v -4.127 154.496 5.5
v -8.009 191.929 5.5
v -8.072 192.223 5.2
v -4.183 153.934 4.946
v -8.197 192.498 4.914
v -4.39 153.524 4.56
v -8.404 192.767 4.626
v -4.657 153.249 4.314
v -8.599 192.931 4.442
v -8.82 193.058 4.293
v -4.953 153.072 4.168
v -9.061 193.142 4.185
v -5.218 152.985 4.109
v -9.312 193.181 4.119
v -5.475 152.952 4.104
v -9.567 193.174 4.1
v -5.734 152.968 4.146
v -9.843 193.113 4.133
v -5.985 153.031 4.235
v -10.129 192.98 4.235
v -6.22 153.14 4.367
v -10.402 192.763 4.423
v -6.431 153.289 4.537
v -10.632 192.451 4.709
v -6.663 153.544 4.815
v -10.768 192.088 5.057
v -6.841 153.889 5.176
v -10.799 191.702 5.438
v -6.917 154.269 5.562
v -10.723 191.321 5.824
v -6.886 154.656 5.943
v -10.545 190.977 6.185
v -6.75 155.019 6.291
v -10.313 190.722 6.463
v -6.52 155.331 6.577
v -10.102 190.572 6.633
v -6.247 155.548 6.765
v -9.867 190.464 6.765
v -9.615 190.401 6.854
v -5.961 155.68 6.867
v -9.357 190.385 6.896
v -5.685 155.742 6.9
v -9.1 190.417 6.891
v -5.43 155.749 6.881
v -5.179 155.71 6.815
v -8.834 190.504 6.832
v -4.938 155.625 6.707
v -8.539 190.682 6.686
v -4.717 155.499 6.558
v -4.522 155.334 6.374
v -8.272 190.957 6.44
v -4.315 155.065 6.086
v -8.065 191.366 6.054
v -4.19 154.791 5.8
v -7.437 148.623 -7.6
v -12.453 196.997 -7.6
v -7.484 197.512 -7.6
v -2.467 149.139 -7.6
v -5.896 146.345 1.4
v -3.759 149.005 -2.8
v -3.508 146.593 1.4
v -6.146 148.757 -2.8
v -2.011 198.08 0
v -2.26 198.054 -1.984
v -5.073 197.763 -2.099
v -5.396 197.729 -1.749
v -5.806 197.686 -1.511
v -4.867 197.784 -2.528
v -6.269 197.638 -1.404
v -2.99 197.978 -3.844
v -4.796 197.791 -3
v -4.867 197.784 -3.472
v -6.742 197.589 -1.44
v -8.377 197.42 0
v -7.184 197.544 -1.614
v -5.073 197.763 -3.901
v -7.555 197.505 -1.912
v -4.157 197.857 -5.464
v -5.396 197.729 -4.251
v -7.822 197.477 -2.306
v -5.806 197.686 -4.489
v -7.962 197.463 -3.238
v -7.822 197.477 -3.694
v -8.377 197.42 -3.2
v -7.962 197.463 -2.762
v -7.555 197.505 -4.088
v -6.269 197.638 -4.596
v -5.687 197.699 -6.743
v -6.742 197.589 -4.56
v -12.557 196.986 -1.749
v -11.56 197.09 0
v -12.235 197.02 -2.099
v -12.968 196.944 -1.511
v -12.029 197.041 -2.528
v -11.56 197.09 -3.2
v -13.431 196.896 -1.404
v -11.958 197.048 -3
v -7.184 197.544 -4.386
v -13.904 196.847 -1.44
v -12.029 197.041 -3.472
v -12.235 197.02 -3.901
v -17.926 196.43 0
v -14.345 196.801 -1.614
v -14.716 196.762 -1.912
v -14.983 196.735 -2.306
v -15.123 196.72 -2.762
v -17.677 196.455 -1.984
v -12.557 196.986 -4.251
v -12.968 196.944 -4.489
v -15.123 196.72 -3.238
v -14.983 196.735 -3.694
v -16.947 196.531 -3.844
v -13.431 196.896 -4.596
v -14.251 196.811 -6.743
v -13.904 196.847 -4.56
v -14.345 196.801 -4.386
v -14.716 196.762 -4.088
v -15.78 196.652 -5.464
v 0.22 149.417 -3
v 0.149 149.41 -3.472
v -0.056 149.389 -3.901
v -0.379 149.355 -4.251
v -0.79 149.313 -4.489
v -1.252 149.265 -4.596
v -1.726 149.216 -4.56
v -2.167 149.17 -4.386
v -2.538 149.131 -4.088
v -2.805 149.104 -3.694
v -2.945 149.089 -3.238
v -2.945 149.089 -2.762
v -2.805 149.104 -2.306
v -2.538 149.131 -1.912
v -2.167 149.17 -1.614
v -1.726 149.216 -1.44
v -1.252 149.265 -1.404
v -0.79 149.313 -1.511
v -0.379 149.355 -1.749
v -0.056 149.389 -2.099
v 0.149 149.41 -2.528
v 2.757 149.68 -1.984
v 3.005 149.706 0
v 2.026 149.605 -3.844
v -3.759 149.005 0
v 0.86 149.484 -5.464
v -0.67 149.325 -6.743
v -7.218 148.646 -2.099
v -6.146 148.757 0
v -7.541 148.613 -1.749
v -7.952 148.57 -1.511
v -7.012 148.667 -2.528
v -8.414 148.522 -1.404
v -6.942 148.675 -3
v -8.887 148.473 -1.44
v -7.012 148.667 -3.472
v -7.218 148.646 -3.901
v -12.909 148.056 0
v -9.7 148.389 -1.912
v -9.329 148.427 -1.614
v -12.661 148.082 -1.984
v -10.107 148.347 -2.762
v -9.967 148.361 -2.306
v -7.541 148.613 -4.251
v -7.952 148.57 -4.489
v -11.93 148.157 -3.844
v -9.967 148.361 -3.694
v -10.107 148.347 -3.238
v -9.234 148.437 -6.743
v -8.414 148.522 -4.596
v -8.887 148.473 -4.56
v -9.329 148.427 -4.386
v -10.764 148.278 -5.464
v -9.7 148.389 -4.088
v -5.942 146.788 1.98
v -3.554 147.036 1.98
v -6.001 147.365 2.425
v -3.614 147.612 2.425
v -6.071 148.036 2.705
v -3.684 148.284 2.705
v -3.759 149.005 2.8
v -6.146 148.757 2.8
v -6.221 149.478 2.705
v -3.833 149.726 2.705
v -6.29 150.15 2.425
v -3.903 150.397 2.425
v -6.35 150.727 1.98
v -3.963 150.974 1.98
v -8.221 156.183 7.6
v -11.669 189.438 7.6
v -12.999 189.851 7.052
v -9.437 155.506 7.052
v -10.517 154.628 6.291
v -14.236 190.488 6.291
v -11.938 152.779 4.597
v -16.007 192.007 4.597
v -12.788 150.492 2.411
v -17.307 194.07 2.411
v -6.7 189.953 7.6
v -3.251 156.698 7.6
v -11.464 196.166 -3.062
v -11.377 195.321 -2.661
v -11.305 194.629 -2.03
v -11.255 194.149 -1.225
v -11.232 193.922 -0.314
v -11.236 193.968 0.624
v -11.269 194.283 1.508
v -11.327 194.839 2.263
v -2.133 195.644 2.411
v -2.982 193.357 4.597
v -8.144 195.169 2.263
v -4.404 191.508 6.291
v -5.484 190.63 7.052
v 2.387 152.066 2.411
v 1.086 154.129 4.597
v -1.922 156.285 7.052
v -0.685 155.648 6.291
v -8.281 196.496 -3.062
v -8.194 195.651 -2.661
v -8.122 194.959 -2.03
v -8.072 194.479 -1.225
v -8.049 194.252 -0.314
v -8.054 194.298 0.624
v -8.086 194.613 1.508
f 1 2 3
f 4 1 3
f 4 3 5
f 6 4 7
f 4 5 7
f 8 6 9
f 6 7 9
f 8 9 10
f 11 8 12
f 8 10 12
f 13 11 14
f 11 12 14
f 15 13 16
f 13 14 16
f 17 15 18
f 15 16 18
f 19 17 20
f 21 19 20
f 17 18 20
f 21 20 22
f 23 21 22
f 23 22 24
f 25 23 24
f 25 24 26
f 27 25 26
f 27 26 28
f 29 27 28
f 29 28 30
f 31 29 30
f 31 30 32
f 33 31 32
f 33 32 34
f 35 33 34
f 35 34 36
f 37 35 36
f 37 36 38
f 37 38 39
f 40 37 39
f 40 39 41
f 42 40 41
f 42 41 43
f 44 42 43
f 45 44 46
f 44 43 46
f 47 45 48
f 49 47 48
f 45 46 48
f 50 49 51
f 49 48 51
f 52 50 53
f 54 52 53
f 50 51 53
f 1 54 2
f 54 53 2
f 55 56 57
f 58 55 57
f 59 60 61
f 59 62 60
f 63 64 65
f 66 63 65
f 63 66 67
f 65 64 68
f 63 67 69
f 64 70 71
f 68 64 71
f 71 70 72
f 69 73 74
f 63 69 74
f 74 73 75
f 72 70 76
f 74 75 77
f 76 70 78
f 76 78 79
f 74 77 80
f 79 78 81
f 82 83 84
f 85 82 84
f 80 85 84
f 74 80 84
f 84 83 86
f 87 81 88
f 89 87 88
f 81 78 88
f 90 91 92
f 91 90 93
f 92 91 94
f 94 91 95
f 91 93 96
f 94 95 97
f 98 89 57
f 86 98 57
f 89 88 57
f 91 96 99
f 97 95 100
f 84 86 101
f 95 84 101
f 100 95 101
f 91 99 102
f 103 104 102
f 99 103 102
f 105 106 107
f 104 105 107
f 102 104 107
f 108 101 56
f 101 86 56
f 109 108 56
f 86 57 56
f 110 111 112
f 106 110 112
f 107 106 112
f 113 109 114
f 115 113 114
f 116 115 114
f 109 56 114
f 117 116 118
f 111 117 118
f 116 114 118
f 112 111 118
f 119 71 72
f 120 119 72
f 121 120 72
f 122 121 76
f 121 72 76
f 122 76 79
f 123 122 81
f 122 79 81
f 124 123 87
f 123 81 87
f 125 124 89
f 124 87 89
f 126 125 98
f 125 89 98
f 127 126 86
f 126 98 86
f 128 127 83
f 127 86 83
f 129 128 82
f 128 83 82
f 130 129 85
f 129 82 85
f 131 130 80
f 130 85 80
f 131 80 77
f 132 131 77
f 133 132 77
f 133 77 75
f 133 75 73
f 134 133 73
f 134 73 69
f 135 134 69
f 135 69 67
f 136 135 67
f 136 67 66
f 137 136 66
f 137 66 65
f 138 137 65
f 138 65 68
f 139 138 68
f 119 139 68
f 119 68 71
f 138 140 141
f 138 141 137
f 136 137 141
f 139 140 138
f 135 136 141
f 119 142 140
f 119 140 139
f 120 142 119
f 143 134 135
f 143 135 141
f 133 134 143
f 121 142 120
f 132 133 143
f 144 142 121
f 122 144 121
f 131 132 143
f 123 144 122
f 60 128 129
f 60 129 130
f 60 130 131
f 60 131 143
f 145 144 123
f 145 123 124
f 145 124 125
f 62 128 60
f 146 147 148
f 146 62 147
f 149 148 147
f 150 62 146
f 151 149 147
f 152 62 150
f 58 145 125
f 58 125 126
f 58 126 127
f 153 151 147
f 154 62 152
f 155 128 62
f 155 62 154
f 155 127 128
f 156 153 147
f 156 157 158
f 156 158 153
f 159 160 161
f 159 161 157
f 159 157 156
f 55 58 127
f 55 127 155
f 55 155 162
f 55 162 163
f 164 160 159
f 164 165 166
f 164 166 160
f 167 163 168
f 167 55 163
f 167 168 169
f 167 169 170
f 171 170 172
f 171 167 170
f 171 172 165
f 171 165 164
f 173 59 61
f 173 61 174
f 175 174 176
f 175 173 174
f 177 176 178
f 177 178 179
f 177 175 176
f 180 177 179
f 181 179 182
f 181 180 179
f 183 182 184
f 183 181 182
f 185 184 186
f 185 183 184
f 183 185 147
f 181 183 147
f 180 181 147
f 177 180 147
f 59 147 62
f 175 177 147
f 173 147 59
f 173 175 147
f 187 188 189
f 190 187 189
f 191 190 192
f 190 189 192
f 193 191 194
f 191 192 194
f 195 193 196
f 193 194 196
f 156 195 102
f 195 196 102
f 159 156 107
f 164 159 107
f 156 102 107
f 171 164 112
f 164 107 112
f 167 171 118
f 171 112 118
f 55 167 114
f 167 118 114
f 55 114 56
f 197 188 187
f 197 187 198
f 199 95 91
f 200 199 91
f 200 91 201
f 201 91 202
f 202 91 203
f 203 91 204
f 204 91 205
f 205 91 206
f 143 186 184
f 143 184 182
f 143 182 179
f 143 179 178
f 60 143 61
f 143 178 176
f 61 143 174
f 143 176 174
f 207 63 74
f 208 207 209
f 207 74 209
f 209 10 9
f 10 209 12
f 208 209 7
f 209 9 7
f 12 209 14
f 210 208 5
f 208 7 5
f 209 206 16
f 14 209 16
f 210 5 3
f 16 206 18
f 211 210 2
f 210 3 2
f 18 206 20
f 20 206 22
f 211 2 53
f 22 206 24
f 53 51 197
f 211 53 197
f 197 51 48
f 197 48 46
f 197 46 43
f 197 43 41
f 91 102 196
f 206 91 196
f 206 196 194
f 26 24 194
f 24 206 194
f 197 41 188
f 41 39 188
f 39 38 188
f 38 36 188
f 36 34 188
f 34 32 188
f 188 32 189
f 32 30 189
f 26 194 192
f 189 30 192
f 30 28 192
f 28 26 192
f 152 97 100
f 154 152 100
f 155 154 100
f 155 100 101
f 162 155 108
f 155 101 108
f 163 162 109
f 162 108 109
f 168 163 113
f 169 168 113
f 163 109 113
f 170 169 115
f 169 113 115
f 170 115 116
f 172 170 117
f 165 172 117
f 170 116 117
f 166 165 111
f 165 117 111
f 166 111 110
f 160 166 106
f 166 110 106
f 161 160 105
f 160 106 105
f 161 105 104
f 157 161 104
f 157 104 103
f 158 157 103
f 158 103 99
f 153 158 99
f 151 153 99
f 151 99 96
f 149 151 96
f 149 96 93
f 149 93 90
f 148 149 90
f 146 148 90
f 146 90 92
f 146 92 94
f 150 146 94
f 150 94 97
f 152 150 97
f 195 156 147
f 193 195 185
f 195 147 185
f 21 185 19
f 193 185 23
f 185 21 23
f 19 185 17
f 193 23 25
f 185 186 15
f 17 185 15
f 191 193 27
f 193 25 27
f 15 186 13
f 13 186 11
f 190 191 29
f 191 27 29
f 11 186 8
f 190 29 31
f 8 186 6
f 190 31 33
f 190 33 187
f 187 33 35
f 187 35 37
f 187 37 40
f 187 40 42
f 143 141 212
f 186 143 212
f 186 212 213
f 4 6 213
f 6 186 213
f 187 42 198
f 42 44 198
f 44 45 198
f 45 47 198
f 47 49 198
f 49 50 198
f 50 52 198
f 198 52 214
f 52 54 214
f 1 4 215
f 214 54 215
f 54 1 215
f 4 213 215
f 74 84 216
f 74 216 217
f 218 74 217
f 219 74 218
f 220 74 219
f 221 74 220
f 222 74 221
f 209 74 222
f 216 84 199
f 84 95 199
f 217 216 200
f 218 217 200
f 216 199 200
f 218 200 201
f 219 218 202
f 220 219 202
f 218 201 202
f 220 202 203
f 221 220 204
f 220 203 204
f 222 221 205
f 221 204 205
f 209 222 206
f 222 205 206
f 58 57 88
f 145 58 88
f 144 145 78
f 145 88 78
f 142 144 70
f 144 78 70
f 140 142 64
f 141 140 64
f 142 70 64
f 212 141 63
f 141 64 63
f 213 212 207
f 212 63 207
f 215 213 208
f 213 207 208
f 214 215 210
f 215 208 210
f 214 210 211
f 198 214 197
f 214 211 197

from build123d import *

# Parameters (mm, degrees)
SKETCH3_R               = 8
BOSS_EXTRUDE1_DEPTH     = 48.633157895
CUT_EXTRUDE1_DEPTH      = 13.989776257
CUT_EXTRUDE1_DEPTH_BACK = 13.989776257
BOSS_EXTRUDE2_DEPTH     = 1.2
CUT_EXTRUDE2_DEPTH      = 1.6
SKETCH8_R               = 1.4
SKETCH8_R_2             = 1.6
CUT_EXTRUDE3_DEPTH      = 2.64160469
CUT_EXTRUDE3_DEPTH_BACK = 52.97615102
CUT_EXTRUDE4_DEPTH      = 52.97615102


with BuildPart() as part:
    # Sketch3 → Boss-Extrude1 (new body)
    with BuildSketch(Plane(origin=(-20.344467381, 196.178792599, 0), x_dir=(-0.994665758, -0.103150523, 0), z_dir=(0.103150523, -0.994665758, 0))):
        with Locations((-10.431405186, 0)):
            Circle(SKETCH3_R)
    extrude(amount=BOSS_EXTRUDE1_DEPTH)

    # Sketch4 → Cut-Extrude1 (cut, two sides)
    with BuildSketch(Plane(origin=(10.375761543, 1.076004901, 0), x_dir=(0.103150523, -0.994665758, 0), z_dir=(-0.994665758, -0.103150523, 0))) as cut_extrude1_sk:
        Polygon((-197.230869842, 0), (-189.230869842, 8), (-197.230869842, 8), align=None)
        Polygon((-156.597711947, 8), (-148.597711947, 8), (-148.597711947, 0), align=None)
    extrude(amount=CUT_EXTRUDE1_DEPTH, mode=Mode.SUBTRACT)
    extrude(cut_extrude1_sk.sketch, amount=-CUT_EXTRUDE1_DEPTH_BACK, mode=Mode.SUBTRACT)

    # Sketch5 → Boss-Extrude2 (add, symmetric)
    with BuildSketch(Plane(origin=(10.375761543, 1.076004901, 0), x_dir=(0.103150523, -0.994665758, 0), z_dir=(-0.994665758, -0.103150523, 0))):
        with BuildLine():
            Line((-148.597711947, -2.8), (-146.172840817, 1.4))
            ThreePointArc((-146.172840817, 1.4), (-148.232238609, 2.776045612), (-150.577610935, 1.979898987))
            Line((-150.577610935, 1.979898987), (-148.597711947, 0))
            Line((-148.597711947, 0), (-148.597711947, -2.8))
        make_face()
    extrude(amount=BOSS_EXTRUDE2_DEPTH, both=True)

    # Sketch7 → Cut-Extrude2 (cut, symmetric)
    with BuildSketch(Plane(origin=(10.375761543, 1.076004901, 0), x_dir=(0.103150523, -0.994665758, 0), z_dir=(-0.994665758, -0.103150523, 0))):
        with BuildLine():
            Line((-194.968128142, 2.2627417), (-197.230869842, 0))
            Line((-197.230869842, 0), (-197.230869842, -3.2))
            ThreePointArc((-197.230869842, -3.2), (-194.274455338, -1.224586984), (-194.968128142, 2.2627417))
        make_face()
    extrude(amount=CUT_EXTRUDE2_DEPTH, both=True, mode=Mode.SUBTRACT)

    # Sketch8 → Cut-Extrude3 (cut, two sides)
    with BuildSketch(Plane(origin=(-20.344467381, 196.178792599, 0), x_dir=(0.994665758, 0.103150523, 0), z_dir=(-0.103150523, 0.994665758, 0))) as cut_extrude3_sk:
        with Locations((10.431405186, -5.5)):
            Circle(SKETCH8_R)
        with Locations((6.831405186, 3)):
            Circle(SKETCH8_R_2)
        with Locations((14.031405186, 3)):
            Circle(SKETCH8_R_2)
    extrude(amount=CUT_EXTRUDE3_DEPTH, mode=Mode.SUBTRACT)
    extrude(cut_extrude3_sk.sketch, amount=-CUT_EXTRUDE3_DEPTH_BACK, mode=Mode.SUBTRACT)

    # Sketch9 → Cut-Extrude4 (cut, through all)
    with BuildSketch(Plane(origin=(-20.344467381, 196.178792599, 0), x_dir=(0.994665758, 0.103150523, 0), z_dir=(-0.103150523, 0.994665758, 0))):
        with BuildLine():
            Line((7.933405986, 7.6), (12.929404385, 7.6))
            ThreePointArc((12.929404385, 7.6), (10.431405186, 8), (7.933405986, 7.6))
        make_face()
        with BuildLine():
            Line((7.933405986, -7.6), (12.929404385, -7.6))
            ThreePointArc((12.929404385, -7.6), (10.431405186, -8), (7.933405986, -7.6))
        make_face()
    extrude(amount=-CUT_EXTRUDE4_DEPTH, mode=Mode.SUBTRACT)


solid = part.part
